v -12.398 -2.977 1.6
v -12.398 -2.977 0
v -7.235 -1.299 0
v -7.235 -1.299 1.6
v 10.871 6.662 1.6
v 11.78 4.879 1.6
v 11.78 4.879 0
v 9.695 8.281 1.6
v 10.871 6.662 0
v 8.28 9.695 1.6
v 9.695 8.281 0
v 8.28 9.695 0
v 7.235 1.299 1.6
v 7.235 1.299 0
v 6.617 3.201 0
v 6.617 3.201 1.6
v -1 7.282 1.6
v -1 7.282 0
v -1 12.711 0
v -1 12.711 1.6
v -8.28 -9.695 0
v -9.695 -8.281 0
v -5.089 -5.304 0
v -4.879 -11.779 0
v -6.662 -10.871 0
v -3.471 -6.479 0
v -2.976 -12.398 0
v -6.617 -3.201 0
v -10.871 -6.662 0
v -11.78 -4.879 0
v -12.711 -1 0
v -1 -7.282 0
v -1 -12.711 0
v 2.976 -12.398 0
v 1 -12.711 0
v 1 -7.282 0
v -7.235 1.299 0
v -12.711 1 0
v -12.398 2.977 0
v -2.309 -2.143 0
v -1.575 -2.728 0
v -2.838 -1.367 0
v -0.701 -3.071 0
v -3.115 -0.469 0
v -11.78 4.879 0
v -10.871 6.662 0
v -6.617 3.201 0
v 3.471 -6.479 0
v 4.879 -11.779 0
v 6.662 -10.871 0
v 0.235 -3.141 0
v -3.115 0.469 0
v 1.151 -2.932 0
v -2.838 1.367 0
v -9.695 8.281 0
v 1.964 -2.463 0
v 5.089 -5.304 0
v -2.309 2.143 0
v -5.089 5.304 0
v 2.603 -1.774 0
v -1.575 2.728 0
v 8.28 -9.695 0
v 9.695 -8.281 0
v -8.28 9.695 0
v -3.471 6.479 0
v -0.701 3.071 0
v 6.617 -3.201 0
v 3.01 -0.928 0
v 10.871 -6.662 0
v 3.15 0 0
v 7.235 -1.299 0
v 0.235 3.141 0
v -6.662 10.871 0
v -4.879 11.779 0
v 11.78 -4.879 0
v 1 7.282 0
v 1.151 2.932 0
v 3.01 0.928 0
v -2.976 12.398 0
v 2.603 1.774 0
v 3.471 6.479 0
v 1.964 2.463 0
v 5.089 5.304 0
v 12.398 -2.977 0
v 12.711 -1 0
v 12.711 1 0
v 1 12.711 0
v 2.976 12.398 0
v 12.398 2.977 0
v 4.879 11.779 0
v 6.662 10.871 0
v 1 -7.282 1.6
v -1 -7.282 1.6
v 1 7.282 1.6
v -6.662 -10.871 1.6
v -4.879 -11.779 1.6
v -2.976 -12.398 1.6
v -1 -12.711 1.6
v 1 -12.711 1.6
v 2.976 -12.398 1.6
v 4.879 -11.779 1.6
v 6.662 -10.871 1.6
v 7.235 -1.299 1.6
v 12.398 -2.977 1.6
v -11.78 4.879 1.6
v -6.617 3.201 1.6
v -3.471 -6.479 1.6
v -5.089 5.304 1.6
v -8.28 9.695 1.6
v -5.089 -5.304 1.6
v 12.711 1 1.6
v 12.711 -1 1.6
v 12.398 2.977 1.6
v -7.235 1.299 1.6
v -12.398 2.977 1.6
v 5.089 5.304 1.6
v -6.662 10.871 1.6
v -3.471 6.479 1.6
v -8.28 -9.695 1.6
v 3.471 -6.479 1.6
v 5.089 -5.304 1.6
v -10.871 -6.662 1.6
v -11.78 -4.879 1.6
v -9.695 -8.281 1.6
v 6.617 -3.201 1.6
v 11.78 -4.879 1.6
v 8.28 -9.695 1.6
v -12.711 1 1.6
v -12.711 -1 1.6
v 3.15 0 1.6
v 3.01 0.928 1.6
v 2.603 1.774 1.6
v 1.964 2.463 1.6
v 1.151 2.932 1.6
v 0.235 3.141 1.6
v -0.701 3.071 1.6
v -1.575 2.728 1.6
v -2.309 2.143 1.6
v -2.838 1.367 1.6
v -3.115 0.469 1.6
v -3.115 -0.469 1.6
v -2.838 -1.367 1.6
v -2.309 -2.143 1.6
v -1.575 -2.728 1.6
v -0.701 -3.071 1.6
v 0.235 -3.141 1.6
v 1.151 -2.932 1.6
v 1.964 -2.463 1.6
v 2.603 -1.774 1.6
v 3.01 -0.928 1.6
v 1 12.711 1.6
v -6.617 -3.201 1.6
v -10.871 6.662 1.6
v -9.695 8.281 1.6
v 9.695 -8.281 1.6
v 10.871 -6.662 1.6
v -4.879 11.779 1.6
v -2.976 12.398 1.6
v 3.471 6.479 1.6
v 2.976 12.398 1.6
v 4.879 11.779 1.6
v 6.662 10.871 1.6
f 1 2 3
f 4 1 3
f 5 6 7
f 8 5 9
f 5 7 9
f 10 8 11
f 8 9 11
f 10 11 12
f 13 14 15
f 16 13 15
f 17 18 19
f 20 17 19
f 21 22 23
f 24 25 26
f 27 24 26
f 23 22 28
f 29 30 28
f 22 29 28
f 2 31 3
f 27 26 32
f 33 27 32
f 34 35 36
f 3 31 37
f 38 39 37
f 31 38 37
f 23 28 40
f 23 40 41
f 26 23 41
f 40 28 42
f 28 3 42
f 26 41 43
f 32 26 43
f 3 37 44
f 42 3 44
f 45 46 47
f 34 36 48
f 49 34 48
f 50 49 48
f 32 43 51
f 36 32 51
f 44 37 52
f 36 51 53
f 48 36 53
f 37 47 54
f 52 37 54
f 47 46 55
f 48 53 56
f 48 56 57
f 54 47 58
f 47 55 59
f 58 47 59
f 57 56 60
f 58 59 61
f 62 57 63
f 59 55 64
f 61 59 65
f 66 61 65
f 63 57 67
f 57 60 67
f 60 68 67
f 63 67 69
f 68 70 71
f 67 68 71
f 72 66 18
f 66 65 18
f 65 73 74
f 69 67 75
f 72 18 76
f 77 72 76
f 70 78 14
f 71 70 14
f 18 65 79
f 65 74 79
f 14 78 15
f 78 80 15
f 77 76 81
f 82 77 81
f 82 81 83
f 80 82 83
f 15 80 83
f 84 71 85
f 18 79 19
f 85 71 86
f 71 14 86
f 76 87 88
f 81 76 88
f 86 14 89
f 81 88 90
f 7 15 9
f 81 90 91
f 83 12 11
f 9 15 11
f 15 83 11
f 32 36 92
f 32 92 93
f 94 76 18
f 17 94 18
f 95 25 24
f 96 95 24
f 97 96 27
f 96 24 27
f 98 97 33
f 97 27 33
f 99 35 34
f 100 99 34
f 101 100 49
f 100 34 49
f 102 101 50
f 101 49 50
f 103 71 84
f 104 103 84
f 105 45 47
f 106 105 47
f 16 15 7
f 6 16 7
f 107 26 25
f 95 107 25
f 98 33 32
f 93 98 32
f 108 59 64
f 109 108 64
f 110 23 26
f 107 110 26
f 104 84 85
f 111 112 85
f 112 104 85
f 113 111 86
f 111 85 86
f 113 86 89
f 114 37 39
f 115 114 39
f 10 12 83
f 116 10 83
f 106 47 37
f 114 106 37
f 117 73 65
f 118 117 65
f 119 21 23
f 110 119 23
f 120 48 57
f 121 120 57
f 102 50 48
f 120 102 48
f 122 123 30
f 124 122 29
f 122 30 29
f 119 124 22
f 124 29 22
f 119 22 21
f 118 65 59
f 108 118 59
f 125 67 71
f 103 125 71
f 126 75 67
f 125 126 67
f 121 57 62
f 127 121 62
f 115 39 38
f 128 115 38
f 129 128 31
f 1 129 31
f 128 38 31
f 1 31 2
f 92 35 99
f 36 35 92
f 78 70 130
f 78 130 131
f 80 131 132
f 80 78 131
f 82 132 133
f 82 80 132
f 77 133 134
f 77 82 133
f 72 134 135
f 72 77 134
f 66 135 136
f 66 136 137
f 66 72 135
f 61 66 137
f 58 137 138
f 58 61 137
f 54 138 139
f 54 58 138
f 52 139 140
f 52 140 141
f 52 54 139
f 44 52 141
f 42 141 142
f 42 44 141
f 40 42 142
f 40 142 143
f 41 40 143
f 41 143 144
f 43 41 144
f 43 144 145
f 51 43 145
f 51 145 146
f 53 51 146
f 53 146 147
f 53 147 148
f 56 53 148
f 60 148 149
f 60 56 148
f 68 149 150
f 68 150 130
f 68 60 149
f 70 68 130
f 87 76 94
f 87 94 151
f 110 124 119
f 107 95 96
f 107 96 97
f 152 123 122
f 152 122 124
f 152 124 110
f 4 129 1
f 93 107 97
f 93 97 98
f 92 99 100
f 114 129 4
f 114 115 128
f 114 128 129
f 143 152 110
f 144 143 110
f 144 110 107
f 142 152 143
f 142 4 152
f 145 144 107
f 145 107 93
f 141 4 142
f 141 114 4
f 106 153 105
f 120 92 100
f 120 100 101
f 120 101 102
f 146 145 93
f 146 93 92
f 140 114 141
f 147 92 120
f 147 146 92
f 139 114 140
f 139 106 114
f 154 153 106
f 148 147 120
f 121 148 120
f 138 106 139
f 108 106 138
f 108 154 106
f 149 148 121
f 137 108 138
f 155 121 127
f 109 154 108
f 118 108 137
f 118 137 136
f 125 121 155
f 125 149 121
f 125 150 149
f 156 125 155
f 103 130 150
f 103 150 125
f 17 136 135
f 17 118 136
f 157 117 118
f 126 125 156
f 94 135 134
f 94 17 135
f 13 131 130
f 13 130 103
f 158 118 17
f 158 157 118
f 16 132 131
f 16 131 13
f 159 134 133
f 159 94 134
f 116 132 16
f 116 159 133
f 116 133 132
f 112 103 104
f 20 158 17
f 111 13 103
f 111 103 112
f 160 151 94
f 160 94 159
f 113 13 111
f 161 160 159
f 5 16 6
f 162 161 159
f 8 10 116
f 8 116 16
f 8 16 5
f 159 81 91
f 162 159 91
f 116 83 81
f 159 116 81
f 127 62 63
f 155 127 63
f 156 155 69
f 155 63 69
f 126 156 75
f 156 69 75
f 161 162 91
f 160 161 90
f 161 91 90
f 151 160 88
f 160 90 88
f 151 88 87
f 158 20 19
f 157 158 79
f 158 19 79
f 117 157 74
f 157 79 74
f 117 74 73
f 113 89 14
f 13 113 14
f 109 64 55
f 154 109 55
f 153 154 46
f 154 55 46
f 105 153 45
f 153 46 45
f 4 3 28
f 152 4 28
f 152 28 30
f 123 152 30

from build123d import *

# Parameters (mm, degrees)
SKETCH_1_R          = 12.75
SKETCH_1_R_2        = 3.15
EXTRUDE_1_DEPTH     = 1.6
SKETCH_3_W          = 2
SKETCH_3_H          = 5.467924172
CUT_EXTRUDE_3_DEPTH = 19.102071705


with BuildPart() as part:
    # Эскиз1 → Бобышка-Вытянуть1 (new body)
    with BuildSketch(Plane.XY):
        Circle(SKETCH_1_R)
        Circle(SKETCH_1_R_2, mode=Mode.SUBTRACT)
    extrude(amount=EXTRUDE_1_DEPTH)

    # Эскиз3 → Вырез-Вытянуть-Тонкостенный3 (cut, through all)
    with BuildSketch(Plane(origin=(0, 0, 0), x_dir=(-1, 0, 0), z_dir=(0, 0, -1))):
        with Locations((0, -10.016037914)):
            Rectangle(SKETCH_3_W, SKETCH_3_H)
        Polygon((-6.685244972, -10.902751931), (-3.471279784, -6.479108352), (-5.089313772, -5.303537847), (-8.303278961, -9.727181426), align=None)
        Polygon((-11.816953588, -4.891023195), (-6.616648674, -3.201341702), (-7.234682663, -1.299228669), (-12.434987577, -2.988910162), align=None)
        Polygon((-12.434987577, 2.988910162), (-7.234682663, 1.299228669), (-6.616648674, 3.201341702), (-11.816953588, 4.891023195), align=None)
        Polygon((-8.303278961, 9.727181426), (-5.089313772, 5.303537847), (-3.471279784, 6.479108352), (-6.685244972, 10.902751931), align=None)
        with Locations((0, 10.016037914)):
            Rectangle(SKETCH_3_W, SKETCH_3_H)
        Polygon((6.685244972, 10.902751931), (3.471279784, 6.479108352), (5.089313772, 5.303537847), (8.303278961, 9.727181426), align=None)
        Polygon((11.816953588, 4.891023195), (6.616648674, 3.201341702), (7.234682663, 1.299228669), (12.434987577, 2.988910162), align=None)
        Polygon((12.434987577, -2.988910162), (7.234682663, -1.299228669), (6.616648674, -3.201341702), (11.816953588, -4.891023195), align=None)
        Polygon((8.303278961, -9.727181426), (5.089313772, -5.303537847), (3.471279784, -6.479108352), (6.685244972, -10.902751931), align=None)
    extrude(amount=-CUT_EXTRUDE_3_DEPTH, mode=Mode.SUBTRACT)


solid = part.part
